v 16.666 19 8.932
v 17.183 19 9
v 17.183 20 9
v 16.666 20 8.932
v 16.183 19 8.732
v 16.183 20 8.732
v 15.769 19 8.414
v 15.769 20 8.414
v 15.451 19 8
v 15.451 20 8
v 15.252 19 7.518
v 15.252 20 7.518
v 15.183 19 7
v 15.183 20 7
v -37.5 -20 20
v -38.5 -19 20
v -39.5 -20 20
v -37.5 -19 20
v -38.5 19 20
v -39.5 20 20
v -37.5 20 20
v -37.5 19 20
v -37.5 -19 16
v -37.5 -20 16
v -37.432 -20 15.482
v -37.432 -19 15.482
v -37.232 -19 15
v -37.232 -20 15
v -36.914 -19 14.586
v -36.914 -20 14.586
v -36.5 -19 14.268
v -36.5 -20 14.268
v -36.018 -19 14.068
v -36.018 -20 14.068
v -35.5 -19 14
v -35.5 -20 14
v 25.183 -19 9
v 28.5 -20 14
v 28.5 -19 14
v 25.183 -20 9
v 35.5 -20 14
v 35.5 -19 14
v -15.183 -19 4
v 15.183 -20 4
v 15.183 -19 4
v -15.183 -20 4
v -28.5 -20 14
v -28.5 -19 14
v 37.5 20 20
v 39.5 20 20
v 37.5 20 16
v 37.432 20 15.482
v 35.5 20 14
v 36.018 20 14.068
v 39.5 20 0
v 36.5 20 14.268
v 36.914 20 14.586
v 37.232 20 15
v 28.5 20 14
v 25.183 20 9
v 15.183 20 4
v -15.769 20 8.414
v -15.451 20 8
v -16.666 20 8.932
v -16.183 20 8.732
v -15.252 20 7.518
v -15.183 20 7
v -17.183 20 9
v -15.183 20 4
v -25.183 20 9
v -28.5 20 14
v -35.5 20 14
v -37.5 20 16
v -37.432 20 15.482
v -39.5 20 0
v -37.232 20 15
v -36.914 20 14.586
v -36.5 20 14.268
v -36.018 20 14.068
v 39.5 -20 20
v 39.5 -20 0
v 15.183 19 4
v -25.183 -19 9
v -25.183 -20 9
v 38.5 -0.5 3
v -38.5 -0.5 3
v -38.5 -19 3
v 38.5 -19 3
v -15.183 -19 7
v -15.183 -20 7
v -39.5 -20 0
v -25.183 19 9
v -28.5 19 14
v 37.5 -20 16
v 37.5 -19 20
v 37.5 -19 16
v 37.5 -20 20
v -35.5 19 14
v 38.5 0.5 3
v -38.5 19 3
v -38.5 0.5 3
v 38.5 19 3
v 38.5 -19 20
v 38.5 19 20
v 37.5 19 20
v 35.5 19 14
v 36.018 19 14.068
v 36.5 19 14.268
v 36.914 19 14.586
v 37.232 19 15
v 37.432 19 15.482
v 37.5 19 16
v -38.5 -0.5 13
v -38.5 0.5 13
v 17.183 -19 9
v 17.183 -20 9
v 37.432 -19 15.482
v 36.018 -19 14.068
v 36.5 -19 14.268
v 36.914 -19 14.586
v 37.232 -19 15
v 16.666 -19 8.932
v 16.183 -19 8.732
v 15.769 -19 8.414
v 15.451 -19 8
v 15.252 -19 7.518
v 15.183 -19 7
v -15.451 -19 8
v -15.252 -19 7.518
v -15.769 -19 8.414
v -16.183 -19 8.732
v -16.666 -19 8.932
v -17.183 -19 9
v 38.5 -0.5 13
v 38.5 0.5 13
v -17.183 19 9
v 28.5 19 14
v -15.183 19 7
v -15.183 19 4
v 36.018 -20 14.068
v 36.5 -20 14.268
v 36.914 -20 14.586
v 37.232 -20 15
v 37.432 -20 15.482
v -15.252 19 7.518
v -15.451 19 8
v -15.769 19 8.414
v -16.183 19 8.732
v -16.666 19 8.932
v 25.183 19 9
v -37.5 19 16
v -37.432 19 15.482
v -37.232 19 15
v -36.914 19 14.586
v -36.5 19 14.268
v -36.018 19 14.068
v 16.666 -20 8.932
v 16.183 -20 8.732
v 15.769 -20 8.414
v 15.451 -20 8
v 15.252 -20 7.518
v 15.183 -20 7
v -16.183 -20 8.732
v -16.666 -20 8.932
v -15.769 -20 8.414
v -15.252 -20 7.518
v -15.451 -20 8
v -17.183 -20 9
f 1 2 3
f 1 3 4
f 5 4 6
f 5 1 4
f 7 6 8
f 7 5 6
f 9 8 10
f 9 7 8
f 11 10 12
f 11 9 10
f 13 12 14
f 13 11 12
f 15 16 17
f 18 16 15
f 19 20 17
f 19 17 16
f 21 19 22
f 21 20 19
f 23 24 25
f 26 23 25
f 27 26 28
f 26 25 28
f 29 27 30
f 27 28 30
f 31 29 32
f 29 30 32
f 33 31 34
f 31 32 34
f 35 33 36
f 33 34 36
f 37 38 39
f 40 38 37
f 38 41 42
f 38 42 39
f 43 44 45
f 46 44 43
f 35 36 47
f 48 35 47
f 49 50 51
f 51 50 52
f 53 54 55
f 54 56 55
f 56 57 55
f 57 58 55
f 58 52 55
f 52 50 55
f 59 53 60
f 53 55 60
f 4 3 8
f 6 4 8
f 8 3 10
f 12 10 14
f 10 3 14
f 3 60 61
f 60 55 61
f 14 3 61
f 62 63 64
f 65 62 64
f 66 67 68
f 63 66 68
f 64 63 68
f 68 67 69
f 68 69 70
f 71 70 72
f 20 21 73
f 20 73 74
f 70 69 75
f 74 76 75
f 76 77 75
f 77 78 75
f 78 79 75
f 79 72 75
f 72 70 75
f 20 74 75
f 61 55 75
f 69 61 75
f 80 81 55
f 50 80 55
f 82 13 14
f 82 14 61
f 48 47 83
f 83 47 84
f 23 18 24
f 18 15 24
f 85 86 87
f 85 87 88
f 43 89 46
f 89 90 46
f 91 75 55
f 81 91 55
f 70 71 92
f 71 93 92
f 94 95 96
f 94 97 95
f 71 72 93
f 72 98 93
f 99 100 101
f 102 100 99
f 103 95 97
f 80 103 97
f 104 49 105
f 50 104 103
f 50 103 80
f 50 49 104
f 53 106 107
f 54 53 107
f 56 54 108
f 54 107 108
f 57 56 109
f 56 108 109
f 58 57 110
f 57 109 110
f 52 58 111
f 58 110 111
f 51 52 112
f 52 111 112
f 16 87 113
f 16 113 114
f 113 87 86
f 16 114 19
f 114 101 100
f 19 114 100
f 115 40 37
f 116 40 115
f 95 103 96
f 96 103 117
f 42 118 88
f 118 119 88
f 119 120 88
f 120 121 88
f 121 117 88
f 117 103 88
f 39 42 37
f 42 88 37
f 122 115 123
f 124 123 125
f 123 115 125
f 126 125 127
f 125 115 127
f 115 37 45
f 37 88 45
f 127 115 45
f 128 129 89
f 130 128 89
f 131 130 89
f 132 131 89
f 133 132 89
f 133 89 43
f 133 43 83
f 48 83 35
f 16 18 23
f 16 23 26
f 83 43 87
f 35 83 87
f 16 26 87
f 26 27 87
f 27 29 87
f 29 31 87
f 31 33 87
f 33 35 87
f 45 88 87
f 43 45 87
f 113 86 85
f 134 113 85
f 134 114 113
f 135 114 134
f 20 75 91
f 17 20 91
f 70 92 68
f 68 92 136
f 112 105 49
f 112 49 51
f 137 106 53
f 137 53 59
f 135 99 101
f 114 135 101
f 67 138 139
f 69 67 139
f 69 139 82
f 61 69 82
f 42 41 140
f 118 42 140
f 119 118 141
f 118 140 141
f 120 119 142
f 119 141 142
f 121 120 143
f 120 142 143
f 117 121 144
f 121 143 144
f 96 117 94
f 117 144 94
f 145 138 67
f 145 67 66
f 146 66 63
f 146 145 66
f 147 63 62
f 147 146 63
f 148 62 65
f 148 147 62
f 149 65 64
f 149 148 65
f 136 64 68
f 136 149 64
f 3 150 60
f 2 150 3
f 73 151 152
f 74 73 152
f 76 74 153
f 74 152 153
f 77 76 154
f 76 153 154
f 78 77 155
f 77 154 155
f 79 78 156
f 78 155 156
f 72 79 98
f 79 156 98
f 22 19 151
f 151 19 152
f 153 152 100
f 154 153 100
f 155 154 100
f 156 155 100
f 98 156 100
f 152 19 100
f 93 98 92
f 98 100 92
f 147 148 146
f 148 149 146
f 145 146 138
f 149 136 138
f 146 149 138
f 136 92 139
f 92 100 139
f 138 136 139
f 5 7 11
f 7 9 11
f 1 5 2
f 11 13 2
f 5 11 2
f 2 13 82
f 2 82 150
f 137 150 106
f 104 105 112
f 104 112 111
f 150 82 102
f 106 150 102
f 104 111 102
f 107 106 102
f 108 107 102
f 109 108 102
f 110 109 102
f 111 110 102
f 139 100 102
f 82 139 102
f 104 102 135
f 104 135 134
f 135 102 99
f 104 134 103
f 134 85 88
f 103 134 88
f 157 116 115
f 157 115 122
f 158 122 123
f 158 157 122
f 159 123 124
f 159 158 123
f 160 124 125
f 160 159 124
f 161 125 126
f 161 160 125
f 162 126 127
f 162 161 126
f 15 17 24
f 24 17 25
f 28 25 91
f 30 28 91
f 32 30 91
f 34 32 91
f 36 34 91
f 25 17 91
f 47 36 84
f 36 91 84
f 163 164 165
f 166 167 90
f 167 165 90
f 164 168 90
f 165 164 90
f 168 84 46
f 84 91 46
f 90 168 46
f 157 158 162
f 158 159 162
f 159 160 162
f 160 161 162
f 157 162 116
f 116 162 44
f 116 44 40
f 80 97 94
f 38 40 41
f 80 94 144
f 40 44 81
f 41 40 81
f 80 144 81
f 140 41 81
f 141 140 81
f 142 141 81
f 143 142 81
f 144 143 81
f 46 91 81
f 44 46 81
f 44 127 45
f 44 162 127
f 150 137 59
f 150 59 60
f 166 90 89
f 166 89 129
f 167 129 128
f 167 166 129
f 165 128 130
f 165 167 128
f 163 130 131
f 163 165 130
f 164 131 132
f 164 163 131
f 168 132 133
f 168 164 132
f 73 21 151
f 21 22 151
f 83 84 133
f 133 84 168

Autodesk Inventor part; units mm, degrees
ref_plane "YZ Plane" through (0, 0, 0) normal (1, 0, 0) x (0, 1, 0)
ref_plane "XZ Plane" through (0, 0, 0) normal (0, 1, 0) x (-1, 0, 0)
ref_plane "XY Plane" through (0, 0, 0) normal (0, 0, 1) x (1, 0, 0)
sketch "Эскиз1" plane through (0, 0, 0) normal (0, 0, 1) x (1, 0, 0)
  line L0 (-39.5, -20) -> (39.5, -20)
  line L1 (39.5, -20) -> (39.5, 20)
  line L2 (39.5, 20) -> (-39.5, 20)
  line L3 (-39.5, 20) -> (-39.5, -20)
  line L4 (-39.5, -20) -> (39.5, 20) construction
  line L5 (39.5, -20) -> (-39.5, 20) construction
  line L6 (-38.5, 19) -> (38.5, 19)
  line L7 (38.5, 19) -> (38.5, -19)
  line L8 (38.5, -19) -> (-38.5, -19)
  line L9 (-38.5, -19) -> (-38.5, 19)
  point P0 (0, 0)
  dimension "d0" = 79
  dimension "d1" = 40
  dimension "d2" = 1
extrude "Выдавливание1" add sketch "Эскиз1" along normal blind 3 contours L6 L7 L8 L9
extrude "Выдавливание2" add sketch "Эскиз1" along normal blind 20
sketch "Эскиз2" plane through (-39.5, -20, 0) normal (0, -1, 0) x (1, 0, 0)
  line L0 (2, 20) -> (2, 16) construction
  line L1 (4, 14) -> (11, 14)
  arc A0 (2, 16) -> (4, 14) centre (4, 16) ccw
  line L2 (11, 14) -> (11, 9) construction
  line L3 (14.3166, 9) -> (22.3166, 9)
  line L4 (24.3166, 7) -> (24.3166, 4)
  arc A1 (24.3166, 7) -> (22.3166, 9) centre (22.3166, 7) ccw
  line L5 (24.3166, 4) -> (39.5, 4)
  line L6 (39.5, 0) -> (39.5, 20) construction
  line L7 (77, 20) -> (77, 16) construction
  line L8 (75, 14) -> (68, 14)
  arc A2 (75, 14) -> (77, 16) centre (75, 16) ccw
  line L9 (68, 14) -> (64.6834, 9)
  line L10 (64.6834, 9) -> (56.6834, 9)
  line L11 (54.6834, 7) -> (54.6834, 4)
  arc A3 (56.6834, 9) -> (54.6834, 7) centre (56.6834, 7) ccw
  line L12 (54.6834, 4) -> (39.5, 4)
  line L13 (77, 20) -> (77, 16) construction
  line L14 (77, 20) -> (77, 16)
  line L15 (2, 20) -> (77, 20)
  line L16 (14.3166, 9) -> (22.3166, 9)
  line L17 (24.3166, 7) -> (24.3166, 4)
  line L18 (24.3166, 4) -> (54.6834, 4)
  line L19 (54.6834, 4) -> (54.6834, 7)
  line L20 (56.6834, 9) -> (64.6834, 9)
  line L21 (64.6834, 9) -> (68, 14)
  line L22 (68, 14) -> (75, 14)
  line L23 (77, 16) -> (77, 20)
  line L24 (77, 20) -> (2, 20)
  line L25 (11, 14) -> (14.3166, 9)
  line L26 (2, 20) -> (2, 16)
  line L27 (0, 20) -> (79, 20) projected
  point P0 (24.3166, 9)
  dimension "d10" = 2
  dimension "d11" = 5
  dimension "d12" = 6
  dimension "d13" = 10
  dimension "d14" = 5
  dimension "d15" = 2
extrude "Выдавливание3" cut sketch "Эскиз2" against normal up to surface (40 mm away)
sketch "Эскиз3" plane through (0, 0, 3) normal (0, 0, 1) x (1, 0, 0)
  line L0 (38.5, 19) -> (-38.5, 19) projected
  line L1 (-38.5, 19) -> (-38.5, -19) projected
  line L2 (-38.5, -19) -> (38.5, -19) projected
  line L3 (38.5, -19) -> (38.5, 19) projected
  line L4 (-39.5, 20) -> (-39.5, -20) projected
  line L5 (39.5, 0.5) -> (-39.5, 0.5)
  line L6 (-39.5, 0.5) -> (-39.5, -0.5)
  line L7 (-39.5, -0.5) -> (39.5, -0.5)
  line L8 (39.5, -0.5) -> (39.5, 0.5)
  line L9 (39.5, 0.5) -> (-39.5, -0.5) construction
  line L10 (-39.5, 0.5) -> (39.5, -0.5) construction
  point P0 (0, 0)
  dimension "d18" = 1
extrude "Выдавливание4" add sketch "Эскиз3" along normal blind 10 contours L5 L8 L7 L3 | L3 L7 L1 L5 | L1 L7 L4 L5
properties part number "Badrepack"
